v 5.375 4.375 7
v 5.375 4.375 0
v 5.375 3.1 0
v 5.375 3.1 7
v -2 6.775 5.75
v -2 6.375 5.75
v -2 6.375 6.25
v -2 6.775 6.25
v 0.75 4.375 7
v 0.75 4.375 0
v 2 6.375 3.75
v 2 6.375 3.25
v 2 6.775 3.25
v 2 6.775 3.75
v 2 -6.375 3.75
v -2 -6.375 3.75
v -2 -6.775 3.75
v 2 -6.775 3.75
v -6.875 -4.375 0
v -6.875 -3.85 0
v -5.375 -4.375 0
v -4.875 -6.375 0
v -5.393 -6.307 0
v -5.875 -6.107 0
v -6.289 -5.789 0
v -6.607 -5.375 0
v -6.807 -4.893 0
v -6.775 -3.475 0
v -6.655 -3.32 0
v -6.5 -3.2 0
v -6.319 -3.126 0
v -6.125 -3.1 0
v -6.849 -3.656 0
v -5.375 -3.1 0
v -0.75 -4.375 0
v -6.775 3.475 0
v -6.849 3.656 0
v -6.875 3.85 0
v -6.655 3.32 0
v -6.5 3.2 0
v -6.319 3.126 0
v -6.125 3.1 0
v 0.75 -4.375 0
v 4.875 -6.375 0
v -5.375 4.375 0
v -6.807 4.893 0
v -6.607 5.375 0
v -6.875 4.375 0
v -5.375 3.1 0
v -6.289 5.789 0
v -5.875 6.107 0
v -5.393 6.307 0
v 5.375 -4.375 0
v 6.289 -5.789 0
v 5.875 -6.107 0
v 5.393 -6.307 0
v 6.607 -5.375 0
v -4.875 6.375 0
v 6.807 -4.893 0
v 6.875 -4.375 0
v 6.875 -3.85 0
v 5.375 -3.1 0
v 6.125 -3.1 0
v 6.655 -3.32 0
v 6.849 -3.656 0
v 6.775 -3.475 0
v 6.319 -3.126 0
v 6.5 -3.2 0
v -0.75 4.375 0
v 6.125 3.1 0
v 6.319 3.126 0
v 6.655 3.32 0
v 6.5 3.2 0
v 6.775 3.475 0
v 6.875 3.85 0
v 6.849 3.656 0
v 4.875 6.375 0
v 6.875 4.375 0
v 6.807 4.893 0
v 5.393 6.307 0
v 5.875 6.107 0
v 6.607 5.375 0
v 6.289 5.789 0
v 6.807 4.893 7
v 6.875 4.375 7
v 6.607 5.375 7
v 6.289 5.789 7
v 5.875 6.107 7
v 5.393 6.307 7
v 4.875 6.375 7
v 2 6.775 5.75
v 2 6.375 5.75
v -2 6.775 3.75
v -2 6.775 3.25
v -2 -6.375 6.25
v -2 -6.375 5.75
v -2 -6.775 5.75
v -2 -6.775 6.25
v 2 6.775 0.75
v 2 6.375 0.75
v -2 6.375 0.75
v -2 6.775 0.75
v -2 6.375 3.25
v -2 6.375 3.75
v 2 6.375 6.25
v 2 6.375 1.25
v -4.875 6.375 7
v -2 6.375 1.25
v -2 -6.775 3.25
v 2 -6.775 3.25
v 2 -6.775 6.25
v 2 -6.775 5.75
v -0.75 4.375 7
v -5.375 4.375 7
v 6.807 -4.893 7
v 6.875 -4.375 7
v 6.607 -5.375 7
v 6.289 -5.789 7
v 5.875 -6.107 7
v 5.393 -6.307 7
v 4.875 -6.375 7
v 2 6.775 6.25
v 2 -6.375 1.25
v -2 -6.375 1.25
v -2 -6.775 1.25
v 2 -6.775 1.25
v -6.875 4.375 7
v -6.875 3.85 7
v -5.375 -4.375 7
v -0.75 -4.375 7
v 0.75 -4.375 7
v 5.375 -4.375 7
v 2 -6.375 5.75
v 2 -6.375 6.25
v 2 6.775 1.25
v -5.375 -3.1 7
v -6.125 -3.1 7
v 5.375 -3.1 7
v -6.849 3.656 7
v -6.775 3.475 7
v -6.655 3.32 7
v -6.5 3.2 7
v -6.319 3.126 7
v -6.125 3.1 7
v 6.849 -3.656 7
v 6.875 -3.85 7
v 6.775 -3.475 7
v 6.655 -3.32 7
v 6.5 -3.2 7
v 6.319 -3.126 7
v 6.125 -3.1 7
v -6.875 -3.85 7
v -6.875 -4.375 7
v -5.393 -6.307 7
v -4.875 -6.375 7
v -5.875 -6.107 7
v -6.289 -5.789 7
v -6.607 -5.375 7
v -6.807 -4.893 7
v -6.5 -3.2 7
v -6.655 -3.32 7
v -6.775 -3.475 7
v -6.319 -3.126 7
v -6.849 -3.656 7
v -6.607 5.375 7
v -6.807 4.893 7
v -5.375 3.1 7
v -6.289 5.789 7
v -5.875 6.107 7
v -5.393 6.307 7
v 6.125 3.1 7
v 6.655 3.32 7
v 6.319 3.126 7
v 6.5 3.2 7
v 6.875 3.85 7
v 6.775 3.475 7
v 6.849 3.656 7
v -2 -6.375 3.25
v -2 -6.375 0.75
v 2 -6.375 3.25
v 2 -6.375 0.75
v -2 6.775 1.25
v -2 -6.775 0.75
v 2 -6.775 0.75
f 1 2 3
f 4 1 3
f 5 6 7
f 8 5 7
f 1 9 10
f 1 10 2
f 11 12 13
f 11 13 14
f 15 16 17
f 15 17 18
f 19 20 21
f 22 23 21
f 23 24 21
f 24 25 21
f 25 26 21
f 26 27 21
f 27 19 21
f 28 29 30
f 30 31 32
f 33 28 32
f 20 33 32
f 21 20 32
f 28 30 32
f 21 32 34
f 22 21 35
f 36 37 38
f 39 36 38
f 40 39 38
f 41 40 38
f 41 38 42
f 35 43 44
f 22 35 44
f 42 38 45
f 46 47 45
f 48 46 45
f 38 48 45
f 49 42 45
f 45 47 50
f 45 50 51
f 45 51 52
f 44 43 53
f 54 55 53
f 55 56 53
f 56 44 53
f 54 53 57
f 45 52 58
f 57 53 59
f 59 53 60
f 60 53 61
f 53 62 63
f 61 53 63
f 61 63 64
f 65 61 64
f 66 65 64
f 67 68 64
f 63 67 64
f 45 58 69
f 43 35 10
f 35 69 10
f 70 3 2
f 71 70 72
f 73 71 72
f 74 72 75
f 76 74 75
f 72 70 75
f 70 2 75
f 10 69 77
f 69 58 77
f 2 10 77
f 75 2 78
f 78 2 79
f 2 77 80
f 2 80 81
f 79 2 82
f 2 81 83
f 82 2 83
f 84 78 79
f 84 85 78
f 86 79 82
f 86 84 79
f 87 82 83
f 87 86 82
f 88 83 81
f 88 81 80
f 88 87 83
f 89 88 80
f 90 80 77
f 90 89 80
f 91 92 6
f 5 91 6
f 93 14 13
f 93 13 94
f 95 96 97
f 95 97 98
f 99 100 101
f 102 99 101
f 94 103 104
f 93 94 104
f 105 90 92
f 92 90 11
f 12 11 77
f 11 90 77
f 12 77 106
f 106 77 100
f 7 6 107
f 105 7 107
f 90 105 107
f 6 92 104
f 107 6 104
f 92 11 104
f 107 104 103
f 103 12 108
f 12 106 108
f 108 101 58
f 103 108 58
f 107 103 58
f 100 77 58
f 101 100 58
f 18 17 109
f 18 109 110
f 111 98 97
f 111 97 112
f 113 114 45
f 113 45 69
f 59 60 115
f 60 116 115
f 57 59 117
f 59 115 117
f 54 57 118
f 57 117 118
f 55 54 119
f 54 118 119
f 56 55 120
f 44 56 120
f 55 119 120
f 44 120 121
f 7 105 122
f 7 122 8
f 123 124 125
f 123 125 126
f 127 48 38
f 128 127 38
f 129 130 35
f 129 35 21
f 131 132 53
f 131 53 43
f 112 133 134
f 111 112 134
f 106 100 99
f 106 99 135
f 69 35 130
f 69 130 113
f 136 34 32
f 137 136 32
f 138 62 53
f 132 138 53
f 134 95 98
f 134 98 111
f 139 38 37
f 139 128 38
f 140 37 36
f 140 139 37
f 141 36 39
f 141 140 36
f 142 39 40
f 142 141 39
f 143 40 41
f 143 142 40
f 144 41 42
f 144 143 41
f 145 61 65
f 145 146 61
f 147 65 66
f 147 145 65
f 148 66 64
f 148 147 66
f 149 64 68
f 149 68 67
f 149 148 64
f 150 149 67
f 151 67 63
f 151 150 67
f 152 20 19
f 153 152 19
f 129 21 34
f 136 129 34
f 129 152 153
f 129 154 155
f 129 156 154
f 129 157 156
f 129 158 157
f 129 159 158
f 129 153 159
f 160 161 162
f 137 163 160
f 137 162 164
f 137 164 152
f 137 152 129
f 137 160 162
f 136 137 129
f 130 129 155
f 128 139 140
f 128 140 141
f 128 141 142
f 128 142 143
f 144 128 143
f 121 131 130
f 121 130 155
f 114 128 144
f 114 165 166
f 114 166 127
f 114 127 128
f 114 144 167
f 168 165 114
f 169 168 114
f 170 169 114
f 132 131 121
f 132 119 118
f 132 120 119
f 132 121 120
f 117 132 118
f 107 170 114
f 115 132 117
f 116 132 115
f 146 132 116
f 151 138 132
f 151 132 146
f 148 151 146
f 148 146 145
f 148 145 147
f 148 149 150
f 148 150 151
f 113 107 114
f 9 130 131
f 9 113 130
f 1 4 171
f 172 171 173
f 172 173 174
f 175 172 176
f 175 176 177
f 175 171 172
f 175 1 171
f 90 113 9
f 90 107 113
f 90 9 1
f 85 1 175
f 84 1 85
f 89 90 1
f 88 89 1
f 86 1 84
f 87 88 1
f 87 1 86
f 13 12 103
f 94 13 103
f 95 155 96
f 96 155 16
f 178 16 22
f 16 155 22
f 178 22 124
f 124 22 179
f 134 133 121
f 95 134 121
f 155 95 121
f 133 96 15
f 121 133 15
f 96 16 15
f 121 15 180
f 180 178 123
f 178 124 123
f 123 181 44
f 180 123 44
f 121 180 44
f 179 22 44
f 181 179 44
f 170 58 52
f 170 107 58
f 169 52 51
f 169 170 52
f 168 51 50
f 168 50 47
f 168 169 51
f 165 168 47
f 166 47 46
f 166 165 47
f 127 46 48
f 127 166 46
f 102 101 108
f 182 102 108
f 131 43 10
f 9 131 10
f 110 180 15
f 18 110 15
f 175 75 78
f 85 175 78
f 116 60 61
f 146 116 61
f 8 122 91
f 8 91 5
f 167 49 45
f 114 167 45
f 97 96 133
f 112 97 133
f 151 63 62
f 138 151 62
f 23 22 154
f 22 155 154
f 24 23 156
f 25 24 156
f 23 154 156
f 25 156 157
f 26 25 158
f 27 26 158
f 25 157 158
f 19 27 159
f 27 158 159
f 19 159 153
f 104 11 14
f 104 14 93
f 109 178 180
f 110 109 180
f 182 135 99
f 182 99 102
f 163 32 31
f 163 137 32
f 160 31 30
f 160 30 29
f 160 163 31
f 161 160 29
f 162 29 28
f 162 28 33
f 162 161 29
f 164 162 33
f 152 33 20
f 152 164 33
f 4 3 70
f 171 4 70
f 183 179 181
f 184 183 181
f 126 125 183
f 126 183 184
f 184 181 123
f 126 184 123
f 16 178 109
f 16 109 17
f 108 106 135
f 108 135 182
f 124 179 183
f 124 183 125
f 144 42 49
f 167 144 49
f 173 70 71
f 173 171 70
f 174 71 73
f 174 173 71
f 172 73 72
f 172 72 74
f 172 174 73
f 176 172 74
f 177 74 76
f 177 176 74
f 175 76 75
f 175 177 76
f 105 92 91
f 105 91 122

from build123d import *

# Parameters (mm, degrees)
F0_W     = 1.5
F0_H     = 8.75
F1_DEPTH = 7
F2_R     = 0.75
F3_R     = 2
F4_W     = 4
F4_H     = 0.5
F5_DEPTH = 0.4
F6_W     = 4
F6_H     = 0.5
F7_DEPTH = 0.4


# Not quite as in the source:
# - a feature names something its author has since deleted; it is built from what else it names


with BuildPart() as f1:
    # F0 (on Top) → F1 (new body)
    with BuildSketch(Plane.XY):
        Polygon((5.375, -4.375), (0.75, -4.375), (-0.75, -4.375), (-5.375, -4.375), (-5.375, -6.375), (5.375, -6.375), align=None)
        Rectangle(F0_W, F0_H)
        Polygon((-0.75, 4.375), (0.75, 4.375), (5.375, 4.375), (5.375, 6.375), (-5.375, 6.375), (-5.375, 4.375), align=None)
        Polygon((5.375, -3.1), (5.375, -4.375), (5.375, -6.375), (6.875, -6.375), (6.875, -3.1), align=None)
        Polygon((-5.375, -6.375), (-5.375, -4.375), (-5.375, -3.1), (-6.875, -3.1), (-6.875, -6.375), align=None)
        Polygon((5.375, 6.375), (5.375, 4.375), (5.375, 3.1), (6.875, 3.1), (6.875, 6.375), align=None)
        Polygon((-5.375, 3.1), (-5.375, 4.375), (-5.375, 6.375), (-6.875, 6.375), (-6.875, 3.1), align=None)
    extrude(amount=F1_DEPTH)

    # F2
    f2_edges = [f1.edges().sort_by_distance(p)[0] for p in [
        (-6.875, 3.1, 3.5),
        (6.875, 3.1, 3.5),
        (6.875, -3.1, 3.5),
        (-6.875, -3.1, 3.5),
    ]]
    fillet(f2_edges, radius=F2_R)

    # F3
    f3_edges = [f1.edges().sort_by_distance(p)[0] for p in [
        (-6.875, -6.375, 3.5),
        (6.875, -6.375, 3.5),
        (6.875, 6.375, 3.5),
        (-6.875, 6.375, 3.5),
    ]]
    fillet(f3_edges, radius=F3_R)

    # F4 (on face) → F5 (join)
    with BuildSketch(Plane(origin=(0, 6.375, 0), x_dir=(-1, 0, 0), z_dir=(0, 1, 0))):
        with Locations((0, 1)):
            Rectangle(F4_W, F4_H)
        with Locations((0, 3.5)):
            Rectangle(F4_W, F4_H)
        with Locations((0, 6)):
            Rectangle(F4_W, F4_H)
    extrude(amount=F5_DEPTH)

    # F6 (on face) → F7 (join)
    with BuildSketch(Plane.XZ.offset(6.375)):
        with Locations((0, 3.5)):
            Rectangle(F6_W, F6_H)
        with Locations((0, 6)):
            Rectangle(F6_W, F6_H)
        with Locations((0, 1)):
            Rectangle(F6_W, F6_H)
    extrude(amount=F7_DEPTH)


solid = f1.part
